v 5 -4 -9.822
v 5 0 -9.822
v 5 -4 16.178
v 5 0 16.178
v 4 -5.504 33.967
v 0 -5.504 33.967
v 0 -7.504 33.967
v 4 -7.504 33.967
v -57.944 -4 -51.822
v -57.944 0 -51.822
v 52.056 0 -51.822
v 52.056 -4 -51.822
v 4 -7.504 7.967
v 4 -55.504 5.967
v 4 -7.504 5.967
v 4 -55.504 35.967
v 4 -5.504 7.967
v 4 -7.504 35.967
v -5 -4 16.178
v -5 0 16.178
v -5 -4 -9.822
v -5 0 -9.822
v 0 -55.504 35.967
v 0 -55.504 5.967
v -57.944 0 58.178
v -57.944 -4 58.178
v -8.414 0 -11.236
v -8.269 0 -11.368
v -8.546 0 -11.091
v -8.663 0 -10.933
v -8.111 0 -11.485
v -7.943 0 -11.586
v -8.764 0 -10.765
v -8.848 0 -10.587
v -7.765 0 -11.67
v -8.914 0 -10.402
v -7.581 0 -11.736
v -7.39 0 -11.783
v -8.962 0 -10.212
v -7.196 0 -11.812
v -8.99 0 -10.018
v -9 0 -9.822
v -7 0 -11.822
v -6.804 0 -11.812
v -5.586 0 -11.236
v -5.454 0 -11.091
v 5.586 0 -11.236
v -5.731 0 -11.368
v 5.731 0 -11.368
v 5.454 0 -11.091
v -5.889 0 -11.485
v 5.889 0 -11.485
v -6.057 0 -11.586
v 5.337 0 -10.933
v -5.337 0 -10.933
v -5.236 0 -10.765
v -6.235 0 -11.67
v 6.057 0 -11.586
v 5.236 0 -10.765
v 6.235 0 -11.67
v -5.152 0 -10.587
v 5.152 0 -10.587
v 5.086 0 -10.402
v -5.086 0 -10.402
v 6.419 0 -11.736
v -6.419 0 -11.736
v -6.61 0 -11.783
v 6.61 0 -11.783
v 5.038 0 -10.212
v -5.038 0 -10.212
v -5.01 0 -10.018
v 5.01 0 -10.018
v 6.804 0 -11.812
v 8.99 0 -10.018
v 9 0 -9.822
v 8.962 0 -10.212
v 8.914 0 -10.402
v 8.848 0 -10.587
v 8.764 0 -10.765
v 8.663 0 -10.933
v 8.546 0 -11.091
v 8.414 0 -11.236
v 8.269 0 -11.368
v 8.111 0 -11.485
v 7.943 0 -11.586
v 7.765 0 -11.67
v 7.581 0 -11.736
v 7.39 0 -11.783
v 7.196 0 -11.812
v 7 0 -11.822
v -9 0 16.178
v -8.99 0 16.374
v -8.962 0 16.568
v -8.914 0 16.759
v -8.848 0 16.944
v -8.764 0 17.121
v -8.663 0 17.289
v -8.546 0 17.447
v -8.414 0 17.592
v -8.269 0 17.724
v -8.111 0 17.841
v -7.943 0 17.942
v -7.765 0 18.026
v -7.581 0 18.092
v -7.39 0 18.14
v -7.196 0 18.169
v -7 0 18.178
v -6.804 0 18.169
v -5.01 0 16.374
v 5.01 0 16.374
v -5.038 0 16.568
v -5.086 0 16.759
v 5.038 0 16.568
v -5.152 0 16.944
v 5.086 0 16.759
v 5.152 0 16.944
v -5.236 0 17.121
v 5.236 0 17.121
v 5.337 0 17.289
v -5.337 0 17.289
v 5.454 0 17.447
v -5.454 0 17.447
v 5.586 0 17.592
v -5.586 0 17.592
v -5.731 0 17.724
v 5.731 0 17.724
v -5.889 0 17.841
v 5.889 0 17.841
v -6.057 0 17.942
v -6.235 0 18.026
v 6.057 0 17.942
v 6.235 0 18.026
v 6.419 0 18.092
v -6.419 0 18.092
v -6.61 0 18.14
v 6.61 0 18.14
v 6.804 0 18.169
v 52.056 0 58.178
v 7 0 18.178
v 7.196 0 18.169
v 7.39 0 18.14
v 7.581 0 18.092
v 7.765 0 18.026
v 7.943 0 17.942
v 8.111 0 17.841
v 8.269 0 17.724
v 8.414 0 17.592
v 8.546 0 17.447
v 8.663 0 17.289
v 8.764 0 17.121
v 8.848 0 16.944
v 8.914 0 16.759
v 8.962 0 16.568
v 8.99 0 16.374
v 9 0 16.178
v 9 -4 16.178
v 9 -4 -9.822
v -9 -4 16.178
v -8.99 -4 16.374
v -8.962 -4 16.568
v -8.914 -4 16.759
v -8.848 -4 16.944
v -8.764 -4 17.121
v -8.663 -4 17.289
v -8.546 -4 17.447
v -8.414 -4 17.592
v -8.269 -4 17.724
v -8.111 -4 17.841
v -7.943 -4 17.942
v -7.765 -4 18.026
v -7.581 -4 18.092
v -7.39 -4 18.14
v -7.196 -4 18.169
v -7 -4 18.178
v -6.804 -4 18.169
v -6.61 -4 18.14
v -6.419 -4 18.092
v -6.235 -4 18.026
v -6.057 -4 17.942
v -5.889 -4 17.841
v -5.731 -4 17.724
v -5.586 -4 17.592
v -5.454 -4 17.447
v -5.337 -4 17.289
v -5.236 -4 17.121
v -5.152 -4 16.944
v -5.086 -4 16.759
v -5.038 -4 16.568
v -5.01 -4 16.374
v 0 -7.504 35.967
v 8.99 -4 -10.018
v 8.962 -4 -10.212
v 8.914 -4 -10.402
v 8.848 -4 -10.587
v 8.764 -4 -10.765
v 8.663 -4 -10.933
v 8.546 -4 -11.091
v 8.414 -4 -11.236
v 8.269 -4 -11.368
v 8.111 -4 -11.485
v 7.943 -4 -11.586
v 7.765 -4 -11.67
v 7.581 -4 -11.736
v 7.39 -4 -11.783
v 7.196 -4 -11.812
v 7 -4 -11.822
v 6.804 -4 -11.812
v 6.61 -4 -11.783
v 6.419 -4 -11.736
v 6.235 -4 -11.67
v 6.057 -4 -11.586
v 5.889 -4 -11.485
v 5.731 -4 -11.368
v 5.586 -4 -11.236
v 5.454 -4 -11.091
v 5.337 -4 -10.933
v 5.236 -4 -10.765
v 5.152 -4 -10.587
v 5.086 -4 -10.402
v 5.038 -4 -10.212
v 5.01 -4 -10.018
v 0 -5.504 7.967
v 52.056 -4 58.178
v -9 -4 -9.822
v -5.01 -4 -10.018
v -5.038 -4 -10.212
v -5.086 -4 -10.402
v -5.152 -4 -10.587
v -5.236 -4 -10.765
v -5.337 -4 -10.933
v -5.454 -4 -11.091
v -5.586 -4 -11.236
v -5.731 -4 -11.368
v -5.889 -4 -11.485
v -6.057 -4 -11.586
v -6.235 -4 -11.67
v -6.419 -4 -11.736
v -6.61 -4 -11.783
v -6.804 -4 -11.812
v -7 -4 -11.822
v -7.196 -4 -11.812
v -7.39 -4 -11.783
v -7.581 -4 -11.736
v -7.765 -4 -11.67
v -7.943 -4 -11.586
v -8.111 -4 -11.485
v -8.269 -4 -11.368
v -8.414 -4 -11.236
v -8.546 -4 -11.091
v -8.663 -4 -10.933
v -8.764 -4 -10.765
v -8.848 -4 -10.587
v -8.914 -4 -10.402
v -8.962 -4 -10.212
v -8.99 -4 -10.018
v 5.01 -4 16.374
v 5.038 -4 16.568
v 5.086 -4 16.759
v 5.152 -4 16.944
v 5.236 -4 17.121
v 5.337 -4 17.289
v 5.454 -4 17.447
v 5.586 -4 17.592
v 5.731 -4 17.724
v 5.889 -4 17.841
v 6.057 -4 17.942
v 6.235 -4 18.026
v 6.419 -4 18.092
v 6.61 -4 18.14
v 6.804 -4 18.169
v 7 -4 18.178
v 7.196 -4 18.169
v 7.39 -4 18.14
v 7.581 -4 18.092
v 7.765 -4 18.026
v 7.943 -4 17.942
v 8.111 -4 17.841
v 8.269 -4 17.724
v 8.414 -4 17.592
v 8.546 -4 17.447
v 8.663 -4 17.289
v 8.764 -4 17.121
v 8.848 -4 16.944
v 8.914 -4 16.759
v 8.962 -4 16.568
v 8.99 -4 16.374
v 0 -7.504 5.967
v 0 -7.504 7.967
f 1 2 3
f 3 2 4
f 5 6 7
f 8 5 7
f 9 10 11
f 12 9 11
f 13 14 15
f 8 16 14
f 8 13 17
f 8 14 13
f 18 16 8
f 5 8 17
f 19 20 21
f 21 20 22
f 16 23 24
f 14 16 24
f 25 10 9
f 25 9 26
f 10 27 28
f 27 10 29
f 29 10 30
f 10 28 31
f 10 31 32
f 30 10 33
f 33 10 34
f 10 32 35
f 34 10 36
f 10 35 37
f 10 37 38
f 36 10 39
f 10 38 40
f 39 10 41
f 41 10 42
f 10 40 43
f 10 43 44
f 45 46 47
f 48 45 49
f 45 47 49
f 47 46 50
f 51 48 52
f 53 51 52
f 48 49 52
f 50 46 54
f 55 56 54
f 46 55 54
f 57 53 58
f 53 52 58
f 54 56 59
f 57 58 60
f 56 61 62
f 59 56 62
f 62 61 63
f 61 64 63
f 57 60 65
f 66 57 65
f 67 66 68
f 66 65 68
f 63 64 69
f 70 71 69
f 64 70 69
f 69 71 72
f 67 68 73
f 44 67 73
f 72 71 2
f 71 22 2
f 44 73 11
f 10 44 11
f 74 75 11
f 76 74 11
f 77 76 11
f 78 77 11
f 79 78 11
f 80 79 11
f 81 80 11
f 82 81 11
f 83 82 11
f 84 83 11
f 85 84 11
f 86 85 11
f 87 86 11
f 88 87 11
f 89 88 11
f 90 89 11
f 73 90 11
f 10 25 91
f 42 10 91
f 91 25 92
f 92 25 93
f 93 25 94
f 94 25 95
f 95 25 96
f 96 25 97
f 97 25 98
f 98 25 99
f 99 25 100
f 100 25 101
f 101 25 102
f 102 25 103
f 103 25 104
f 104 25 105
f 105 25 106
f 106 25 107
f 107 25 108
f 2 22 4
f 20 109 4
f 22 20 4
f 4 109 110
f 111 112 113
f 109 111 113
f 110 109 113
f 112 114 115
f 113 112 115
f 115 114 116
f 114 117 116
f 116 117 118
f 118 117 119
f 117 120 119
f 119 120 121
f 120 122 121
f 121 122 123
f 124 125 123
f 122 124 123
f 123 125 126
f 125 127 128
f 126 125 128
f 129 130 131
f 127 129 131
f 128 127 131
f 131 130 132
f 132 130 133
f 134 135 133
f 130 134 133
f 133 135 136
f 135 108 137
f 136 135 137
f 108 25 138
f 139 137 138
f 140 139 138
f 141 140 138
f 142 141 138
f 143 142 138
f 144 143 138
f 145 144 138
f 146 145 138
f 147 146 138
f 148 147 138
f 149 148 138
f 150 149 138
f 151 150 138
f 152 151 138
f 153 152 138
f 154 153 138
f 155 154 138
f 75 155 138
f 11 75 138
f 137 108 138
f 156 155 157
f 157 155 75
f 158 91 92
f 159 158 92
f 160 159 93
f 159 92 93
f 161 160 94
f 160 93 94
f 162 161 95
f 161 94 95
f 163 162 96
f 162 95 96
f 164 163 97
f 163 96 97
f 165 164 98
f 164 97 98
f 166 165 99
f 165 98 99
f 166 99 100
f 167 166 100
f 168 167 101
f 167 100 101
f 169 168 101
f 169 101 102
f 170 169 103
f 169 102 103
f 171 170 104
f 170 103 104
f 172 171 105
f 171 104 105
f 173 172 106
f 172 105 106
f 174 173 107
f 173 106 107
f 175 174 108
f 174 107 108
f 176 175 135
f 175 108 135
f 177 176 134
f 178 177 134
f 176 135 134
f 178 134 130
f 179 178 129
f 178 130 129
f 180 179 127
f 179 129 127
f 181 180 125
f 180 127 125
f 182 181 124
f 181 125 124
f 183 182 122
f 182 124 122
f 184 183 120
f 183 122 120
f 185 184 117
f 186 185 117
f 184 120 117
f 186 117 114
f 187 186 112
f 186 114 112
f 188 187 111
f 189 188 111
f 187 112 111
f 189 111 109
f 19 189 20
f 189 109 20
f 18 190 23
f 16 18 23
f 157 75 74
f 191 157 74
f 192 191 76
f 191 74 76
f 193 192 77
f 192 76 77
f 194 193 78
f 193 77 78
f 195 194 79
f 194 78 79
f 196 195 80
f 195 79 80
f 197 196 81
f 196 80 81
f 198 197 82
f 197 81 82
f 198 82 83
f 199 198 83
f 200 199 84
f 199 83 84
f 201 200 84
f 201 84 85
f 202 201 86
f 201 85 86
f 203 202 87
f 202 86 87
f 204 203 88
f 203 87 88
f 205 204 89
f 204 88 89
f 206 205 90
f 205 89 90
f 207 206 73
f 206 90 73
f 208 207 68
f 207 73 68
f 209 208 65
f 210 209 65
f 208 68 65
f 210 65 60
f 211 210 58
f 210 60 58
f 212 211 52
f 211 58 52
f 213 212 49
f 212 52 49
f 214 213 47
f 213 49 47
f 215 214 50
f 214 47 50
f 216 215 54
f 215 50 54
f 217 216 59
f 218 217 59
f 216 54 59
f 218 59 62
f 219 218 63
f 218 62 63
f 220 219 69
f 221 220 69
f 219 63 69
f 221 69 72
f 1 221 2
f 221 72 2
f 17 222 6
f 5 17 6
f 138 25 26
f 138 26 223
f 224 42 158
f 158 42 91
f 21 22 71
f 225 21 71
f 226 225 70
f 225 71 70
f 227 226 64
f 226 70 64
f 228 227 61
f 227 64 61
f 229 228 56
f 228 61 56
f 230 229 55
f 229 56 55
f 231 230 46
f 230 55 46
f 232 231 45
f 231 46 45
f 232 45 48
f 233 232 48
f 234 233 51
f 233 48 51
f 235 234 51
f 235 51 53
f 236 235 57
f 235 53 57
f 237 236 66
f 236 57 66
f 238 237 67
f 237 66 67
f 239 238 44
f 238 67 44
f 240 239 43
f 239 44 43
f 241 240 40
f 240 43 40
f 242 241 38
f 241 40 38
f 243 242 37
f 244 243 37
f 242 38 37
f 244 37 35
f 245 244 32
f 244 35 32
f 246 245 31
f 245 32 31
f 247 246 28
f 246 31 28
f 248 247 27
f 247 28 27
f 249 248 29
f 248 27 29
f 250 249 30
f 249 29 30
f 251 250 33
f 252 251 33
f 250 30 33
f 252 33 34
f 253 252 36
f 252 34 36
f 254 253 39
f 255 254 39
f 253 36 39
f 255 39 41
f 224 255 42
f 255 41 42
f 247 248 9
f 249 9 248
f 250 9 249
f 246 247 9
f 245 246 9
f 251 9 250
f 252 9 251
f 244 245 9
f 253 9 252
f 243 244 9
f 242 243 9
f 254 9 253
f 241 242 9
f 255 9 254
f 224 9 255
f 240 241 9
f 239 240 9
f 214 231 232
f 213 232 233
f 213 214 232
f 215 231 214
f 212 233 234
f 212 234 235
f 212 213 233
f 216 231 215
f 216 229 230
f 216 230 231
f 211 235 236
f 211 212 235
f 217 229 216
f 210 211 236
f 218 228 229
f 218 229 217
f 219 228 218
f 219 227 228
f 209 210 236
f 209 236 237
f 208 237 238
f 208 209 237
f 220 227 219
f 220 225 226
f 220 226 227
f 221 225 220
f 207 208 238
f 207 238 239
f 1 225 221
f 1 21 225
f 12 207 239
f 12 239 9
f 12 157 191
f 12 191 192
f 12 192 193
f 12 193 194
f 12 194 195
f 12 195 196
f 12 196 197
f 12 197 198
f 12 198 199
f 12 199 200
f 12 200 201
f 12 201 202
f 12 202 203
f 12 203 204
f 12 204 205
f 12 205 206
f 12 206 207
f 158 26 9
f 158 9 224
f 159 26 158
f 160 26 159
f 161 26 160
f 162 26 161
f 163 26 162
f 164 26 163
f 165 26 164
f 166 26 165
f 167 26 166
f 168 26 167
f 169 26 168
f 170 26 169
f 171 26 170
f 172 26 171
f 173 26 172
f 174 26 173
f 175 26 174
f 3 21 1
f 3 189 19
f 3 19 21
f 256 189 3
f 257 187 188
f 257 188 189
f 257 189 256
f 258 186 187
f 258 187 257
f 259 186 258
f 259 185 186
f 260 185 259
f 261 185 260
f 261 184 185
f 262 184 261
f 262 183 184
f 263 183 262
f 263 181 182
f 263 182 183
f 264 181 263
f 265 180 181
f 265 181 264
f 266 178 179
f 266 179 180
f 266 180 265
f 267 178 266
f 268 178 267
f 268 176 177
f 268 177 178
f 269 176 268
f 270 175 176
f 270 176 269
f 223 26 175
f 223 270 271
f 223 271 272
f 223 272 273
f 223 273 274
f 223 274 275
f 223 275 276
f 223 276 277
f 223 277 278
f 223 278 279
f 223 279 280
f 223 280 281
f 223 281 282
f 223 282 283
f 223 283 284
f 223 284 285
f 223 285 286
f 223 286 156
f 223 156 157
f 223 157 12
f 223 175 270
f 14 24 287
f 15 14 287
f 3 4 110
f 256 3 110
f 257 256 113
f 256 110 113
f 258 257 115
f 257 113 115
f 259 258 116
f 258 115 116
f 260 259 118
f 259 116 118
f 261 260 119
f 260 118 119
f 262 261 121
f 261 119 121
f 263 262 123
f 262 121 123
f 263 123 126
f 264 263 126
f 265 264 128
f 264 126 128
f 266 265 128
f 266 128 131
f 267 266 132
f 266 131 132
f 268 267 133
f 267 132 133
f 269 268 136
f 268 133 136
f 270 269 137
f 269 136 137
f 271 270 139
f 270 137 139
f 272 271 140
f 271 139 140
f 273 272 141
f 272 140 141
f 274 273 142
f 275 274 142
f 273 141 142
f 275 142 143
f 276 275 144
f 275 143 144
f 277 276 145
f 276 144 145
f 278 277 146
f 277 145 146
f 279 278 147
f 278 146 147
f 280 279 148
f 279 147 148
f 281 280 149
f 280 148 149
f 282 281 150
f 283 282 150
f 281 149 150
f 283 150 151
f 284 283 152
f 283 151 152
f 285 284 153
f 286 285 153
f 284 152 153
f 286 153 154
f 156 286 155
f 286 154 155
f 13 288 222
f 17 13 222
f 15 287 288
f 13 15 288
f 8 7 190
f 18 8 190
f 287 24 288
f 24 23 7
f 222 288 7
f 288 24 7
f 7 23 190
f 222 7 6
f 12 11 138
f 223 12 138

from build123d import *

# Parameters (mm, degrees)
F0_W     = 110
F0_H     = 110
F1_DEPTH = 4
F3_DEPTH = 4


with BuildPart() as f1:
    # F0 (on Front) → F1 (new body)
    with BuildSketch(Plane.XZ):
        with Locations((-2.943903, 3.178192)):
            Rectangle(F0_W, F0_H)
        with BuildLine():
            ThreePointArc((-9, 16.178192), (-7, 18.178192), (-5, 16.178192))
            Line((-5, 16.178192), (-5, -9.821808))
            ThreePointArc((-5, -9.821808), (-7, -11.821808), (-9, -9.821808))
            Line((-9, -9.821808), (-9, 16.178192))
        make_face(mode=Mode.SUBTRACT)
        with BuildLine():
            Line((5, -9.821808), (5, 16.178192))
            ThreePointArc((5, 16.178192), (7, 18.178192), (9, 16.178192))
            Line((9, 16.178192), (9, -9.821808))
            ThreePointArc((9, -9.821808), (7, -11.821808), (5, -9.821808))
        make_face(mode=Mode.SUBTRACT)
    extrude(amount=F1_DEPTH)


with BuildPart() as f3:
    # F2 (on Right) → F3 (new body)
    with BuildSketch(Plane.YZ):
        Polygon((-7.504257, 35.967189), (-55.504257, 35.967189), (-55.504257, 5.967189), (-7.504257, 5.967189), (-7.504257, 7.967189), (-5.504257, 7.967189), (-5.504257, 33.967189), (-7.504257, 33.967189), align=None)
    extrude(amount=F3_DEPTH)


solid = Compound([f1.part, f3.part])
